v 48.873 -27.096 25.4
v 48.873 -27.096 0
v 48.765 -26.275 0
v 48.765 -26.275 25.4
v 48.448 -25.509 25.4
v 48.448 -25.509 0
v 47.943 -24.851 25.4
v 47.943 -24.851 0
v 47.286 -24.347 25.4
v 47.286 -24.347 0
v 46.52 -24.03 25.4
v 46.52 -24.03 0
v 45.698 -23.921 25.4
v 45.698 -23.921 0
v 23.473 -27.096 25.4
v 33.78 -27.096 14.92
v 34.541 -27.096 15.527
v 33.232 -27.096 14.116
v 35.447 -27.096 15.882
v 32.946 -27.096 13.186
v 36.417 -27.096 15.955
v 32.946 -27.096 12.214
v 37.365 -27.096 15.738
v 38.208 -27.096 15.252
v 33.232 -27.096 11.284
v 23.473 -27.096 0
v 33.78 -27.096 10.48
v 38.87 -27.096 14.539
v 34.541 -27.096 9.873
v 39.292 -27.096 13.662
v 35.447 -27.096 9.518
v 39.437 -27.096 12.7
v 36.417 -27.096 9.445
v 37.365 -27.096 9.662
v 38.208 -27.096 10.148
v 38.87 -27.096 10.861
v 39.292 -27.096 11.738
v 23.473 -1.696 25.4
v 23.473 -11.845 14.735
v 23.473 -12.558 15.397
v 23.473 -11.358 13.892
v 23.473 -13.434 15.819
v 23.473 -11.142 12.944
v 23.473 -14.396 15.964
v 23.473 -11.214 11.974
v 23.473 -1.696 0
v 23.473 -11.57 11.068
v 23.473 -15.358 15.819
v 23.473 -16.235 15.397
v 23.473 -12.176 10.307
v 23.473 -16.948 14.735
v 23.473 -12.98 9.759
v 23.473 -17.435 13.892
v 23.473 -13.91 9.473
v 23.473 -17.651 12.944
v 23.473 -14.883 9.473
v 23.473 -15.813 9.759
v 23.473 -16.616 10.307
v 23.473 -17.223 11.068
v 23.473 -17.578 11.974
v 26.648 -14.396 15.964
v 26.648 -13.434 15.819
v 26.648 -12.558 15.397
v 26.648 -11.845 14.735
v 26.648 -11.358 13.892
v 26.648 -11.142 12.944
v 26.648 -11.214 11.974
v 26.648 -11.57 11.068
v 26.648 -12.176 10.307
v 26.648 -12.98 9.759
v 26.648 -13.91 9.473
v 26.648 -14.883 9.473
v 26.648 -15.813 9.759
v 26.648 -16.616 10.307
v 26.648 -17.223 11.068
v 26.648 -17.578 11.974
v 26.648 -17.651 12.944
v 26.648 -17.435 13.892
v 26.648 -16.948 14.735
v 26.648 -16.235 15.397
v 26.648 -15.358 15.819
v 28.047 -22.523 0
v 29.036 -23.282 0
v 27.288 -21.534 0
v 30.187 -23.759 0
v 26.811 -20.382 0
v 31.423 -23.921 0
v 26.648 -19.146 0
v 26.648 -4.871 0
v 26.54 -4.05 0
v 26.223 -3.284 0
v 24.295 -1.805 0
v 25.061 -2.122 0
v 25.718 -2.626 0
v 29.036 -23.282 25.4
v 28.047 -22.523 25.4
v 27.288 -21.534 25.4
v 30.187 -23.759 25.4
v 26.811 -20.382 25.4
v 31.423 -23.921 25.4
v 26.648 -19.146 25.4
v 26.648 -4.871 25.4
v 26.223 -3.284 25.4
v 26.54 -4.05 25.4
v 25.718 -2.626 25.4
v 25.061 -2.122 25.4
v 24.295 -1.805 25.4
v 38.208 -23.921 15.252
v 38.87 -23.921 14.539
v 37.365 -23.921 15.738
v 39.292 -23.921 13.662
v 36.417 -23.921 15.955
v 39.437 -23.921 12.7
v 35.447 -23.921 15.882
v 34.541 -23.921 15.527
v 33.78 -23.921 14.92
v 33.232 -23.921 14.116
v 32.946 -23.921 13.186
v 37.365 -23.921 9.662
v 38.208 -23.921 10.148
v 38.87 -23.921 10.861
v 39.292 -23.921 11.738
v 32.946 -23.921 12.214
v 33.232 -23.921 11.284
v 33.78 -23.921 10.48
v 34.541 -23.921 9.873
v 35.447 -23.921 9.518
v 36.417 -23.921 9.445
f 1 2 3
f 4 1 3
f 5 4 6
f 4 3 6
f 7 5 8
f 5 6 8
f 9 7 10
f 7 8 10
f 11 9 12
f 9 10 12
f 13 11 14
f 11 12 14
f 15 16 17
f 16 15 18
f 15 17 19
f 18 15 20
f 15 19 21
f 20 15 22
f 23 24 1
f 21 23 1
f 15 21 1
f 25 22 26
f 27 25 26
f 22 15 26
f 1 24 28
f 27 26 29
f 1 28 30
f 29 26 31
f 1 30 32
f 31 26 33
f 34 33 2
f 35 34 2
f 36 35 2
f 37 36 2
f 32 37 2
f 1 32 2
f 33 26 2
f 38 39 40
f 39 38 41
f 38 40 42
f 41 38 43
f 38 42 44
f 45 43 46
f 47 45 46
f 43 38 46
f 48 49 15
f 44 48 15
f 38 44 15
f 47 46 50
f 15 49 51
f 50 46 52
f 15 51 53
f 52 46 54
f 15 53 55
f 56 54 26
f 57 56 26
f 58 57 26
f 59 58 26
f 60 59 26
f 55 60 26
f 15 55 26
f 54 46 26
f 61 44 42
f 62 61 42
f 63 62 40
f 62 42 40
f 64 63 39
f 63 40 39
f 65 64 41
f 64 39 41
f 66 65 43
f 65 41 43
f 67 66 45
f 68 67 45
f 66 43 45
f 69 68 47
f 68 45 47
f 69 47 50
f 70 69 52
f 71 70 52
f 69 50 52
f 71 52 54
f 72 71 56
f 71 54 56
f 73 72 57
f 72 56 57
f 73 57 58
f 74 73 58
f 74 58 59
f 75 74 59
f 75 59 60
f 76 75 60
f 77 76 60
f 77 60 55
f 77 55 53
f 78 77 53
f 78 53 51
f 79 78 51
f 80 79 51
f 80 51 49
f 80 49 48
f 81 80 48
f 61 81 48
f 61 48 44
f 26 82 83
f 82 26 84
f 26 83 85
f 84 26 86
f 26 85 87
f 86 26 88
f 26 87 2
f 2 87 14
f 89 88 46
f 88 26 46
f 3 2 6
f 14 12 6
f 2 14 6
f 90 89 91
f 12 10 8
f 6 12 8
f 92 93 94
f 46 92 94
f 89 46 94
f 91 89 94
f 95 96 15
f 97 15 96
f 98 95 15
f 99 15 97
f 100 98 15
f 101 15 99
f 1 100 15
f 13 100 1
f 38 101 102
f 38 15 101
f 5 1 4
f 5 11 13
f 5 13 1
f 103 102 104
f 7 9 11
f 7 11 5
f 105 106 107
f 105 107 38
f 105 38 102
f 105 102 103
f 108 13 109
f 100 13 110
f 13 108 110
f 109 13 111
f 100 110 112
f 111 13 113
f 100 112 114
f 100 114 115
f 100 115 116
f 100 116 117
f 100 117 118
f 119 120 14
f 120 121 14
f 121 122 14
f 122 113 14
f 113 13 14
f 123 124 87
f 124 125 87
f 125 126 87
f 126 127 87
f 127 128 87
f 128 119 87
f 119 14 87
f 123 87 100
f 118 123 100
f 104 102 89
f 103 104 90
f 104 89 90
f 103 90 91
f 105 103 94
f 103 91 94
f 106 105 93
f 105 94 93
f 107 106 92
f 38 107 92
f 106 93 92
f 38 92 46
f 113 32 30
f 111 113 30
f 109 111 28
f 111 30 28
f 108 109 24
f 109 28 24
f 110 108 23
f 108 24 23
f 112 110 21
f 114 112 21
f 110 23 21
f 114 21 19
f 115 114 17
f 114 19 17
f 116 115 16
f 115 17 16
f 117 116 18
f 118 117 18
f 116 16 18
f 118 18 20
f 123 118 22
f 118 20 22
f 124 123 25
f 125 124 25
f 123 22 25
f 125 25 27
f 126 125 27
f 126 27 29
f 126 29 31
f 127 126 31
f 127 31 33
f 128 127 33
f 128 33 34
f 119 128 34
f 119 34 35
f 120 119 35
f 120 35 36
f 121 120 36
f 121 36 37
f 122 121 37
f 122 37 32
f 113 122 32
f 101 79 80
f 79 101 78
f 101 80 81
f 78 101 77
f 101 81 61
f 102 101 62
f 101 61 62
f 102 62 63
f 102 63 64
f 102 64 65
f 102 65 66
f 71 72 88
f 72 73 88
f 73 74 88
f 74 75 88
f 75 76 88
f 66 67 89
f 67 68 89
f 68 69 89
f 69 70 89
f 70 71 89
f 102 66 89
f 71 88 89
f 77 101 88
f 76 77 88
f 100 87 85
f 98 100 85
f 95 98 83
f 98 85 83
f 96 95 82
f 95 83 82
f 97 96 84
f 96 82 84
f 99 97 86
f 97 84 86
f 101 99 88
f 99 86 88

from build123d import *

# Parameters (mm, degrees)
EXTRUDE1_DEPTH     = 25.4
SKETCH2_R          = 3.2639
CUT_EXTRUDE1_DEPTH = 26.4
SKETCH3_R          = 3.2639
CUT_EXTRUDE2_DEPTH = 26.4


with BuildPart() as part:
    # Sketch1 → Extrude1 (new body)
    with BuildSketch(Plane.XY):
        with BuildLine():
            Line((23.473046964, -1.696403207), (23.473046964, -27.096403207))
            Line((23.473046964, -27.096403207), (48.873046964, -27.096403207))
            ThreePointArc((48.873046964, -27.096403207), (47.943110995, -24.851339177), (45.698046964, -23.921403207))
            Line((45.698046964, -23.921403207), (31.423246964, -23.921403207))
            ThreePointArc((31.423246964, -23.921403207), (28.046670663, -22.522779509), (26.648046964, -19.146203207))
            Line((26.648046964, -19.146203207), (26.648046964, -4.871403207))
            ThreePointArc((26.648046964, -4.871403207), (25.718110995, -2.626339177), (23.473046964, -1.696403207))
        make_face()
    extrude(amount=EXTRUDE1_DEPTH)

    # Sketch2 → Cut-Extrude1 (cut, through all)
    with BuildSketch(Plane.ZY.offset(-23.473046964)):
        with Locations((12.7, -14.396403207)):
            Circle(SKETCH2_R)
    extrude(amount=-CUT_EXTRUDE1_DEPTH, mode=Mode.SUBTRACT)

    # Sketch3 → Cut-Extrude2 (cut, through all)
    with BuildSketch(Plane.XZ.offset(27.096403207)):
        with Locations((36.173046964, 12.7)):
            Circle(SKETCH3_R)
    extrude(amount=-CUT_EXTRUDE2_DEPTH, mode=Mode.SUBTRACT)


solid = part.part
